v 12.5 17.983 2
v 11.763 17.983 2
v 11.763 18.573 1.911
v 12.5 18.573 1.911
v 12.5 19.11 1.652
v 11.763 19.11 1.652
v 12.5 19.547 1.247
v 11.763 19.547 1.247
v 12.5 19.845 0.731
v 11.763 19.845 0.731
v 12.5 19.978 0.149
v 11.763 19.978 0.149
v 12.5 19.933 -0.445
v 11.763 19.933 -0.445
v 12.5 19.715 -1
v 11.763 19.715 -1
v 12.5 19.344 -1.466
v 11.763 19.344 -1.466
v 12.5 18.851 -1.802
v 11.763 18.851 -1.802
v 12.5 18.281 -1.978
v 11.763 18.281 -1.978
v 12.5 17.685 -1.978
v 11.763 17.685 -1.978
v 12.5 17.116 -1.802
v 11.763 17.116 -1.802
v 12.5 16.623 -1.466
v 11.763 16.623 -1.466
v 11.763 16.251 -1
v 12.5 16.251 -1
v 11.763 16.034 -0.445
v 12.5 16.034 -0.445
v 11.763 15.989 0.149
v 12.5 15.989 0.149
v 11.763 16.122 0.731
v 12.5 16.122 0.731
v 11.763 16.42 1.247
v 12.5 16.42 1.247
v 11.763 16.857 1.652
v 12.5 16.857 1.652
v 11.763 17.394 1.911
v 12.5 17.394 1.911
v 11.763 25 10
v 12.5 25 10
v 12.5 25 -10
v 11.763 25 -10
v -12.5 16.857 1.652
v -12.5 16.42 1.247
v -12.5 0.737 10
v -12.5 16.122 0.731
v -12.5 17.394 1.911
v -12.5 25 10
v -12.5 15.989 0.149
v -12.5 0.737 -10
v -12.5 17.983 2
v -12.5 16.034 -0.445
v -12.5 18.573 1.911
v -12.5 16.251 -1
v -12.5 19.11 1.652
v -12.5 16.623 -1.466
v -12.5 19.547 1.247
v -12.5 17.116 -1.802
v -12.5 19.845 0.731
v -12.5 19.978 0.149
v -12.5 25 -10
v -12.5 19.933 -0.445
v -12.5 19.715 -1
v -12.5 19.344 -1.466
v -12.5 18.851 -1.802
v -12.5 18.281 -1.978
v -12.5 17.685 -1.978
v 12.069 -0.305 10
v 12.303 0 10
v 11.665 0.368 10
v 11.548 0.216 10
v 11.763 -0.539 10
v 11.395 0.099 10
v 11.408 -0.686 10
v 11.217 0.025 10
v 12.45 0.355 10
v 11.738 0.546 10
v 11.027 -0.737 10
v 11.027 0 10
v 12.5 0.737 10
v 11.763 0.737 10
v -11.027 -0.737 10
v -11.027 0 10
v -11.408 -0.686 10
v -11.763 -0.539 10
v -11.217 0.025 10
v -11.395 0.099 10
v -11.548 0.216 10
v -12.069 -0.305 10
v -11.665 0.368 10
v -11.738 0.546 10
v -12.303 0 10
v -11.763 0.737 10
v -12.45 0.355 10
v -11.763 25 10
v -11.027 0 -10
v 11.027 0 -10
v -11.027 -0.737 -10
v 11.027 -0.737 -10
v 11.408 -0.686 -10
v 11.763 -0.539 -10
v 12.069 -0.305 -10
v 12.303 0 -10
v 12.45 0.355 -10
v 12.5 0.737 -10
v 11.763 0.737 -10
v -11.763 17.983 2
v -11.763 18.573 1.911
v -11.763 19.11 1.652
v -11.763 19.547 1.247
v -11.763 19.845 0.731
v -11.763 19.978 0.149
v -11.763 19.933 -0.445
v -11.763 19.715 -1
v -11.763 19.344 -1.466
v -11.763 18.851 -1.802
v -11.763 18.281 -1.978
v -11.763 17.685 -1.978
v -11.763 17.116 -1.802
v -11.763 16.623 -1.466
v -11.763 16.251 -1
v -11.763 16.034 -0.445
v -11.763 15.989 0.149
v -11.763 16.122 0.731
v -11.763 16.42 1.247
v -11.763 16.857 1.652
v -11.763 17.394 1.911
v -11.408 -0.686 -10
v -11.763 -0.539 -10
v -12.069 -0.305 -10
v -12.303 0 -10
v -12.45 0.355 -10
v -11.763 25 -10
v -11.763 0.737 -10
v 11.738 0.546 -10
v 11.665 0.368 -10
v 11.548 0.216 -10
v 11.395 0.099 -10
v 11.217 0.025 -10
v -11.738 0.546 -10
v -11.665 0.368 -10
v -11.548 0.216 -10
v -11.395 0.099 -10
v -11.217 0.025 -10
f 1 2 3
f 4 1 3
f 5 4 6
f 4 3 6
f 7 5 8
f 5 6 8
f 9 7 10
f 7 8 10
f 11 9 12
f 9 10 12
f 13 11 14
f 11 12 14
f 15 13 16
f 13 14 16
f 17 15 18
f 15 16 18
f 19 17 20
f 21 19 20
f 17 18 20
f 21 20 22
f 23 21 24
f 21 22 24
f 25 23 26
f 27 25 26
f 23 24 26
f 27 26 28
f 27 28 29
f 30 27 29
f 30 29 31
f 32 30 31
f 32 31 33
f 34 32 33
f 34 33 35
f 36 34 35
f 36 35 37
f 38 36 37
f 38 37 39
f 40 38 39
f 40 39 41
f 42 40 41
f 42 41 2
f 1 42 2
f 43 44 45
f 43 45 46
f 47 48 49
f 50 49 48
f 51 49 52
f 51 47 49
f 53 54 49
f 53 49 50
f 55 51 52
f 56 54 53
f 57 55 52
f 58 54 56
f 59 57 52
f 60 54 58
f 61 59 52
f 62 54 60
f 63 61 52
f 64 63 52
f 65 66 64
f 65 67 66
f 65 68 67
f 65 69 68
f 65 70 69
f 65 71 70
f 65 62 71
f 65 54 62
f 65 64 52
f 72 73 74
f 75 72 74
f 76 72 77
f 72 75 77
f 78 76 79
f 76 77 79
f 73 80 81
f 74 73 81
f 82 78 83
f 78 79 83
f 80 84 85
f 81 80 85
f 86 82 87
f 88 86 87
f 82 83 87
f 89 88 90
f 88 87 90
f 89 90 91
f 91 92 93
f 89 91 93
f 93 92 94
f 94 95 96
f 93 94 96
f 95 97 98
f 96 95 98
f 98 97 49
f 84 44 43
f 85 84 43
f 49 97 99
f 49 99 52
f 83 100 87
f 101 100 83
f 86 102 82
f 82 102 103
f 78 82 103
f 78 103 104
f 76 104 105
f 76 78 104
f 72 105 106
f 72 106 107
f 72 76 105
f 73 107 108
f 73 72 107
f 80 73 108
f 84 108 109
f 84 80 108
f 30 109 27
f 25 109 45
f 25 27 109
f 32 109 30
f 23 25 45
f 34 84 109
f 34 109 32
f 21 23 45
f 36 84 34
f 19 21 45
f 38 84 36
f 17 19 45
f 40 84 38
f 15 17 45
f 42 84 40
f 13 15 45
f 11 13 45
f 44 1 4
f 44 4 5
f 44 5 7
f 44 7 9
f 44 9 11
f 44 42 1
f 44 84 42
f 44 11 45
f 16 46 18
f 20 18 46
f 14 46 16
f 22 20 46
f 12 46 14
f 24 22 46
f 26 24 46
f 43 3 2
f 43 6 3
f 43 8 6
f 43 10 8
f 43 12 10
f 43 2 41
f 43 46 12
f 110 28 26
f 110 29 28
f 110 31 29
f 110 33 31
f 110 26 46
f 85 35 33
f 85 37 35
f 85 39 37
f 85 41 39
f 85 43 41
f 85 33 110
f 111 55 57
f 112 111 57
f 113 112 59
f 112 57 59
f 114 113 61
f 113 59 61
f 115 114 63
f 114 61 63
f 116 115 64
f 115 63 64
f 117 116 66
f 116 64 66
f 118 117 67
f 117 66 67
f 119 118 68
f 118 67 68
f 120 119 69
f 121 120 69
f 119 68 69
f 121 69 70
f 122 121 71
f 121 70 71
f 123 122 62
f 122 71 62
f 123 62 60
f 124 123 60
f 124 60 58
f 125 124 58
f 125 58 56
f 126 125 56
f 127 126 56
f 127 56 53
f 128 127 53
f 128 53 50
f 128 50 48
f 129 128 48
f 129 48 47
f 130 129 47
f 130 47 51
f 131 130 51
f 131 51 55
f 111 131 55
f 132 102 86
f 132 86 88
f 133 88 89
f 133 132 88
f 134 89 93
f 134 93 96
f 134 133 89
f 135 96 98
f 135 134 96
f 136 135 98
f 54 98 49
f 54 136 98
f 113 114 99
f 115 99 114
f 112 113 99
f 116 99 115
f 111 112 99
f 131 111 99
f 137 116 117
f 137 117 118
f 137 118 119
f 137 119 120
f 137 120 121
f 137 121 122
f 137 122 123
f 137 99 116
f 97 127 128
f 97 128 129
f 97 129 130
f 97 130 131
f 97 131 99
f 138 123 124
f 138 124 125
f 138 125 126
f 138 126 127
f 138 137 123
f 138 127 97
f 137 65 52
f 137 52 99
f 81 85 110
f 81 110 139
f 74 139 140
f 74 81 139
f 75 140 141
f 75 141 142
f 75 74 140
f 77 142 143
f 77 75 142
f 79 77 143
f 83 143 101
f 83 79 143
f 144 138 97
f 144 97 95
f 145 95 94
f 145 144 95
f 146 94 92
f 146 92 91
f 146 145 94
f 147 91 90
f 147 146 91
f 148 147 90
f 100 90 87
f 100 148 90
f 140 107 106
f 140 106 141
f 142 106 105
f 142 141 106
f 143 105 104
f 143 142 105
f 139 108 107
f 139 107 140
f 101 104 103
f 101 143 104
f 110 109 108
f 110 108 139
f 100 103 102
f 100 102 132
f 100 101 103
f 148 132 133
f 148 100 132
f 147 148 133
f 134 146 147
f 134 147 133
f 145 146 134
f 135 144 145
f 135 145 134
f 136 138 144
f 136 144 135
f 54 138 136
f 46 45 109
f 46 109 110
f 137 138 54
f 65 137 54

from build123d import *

# Parameters (mm, degrees)
SKETCH1_W                      = 25
SKETCH1_H                      = 20
BASE_FLANGE1_DEPTH             = 0.7366
EDGE_FLANGE1_STRIP_W           = 4.4196
EDGE_FLANGE1_STRIP_H           = 0.7366
EDGE_FLANGE1_STRIP_CUT_DEPTH   = 20
EDGE_FLANGE1_STRIP_2_W         = 4.4196
EDGE_FLANGE1_STRIP_2_H         = 0.7366
EDGE_FLANGE1_STRIP_CUT_2_DEPTH = 20
EDGE_FLANGE1_DEPTH             = 20
EDGE_FLANGE1_BEND_DEPTH        = 20
F_4_0_4_DIAMETER_HOLE1_D       = 4


# Sheet-metal steps are written as plain solids
with BuildPart() as part:
    # Sketch1 → Base-Flange1 (new body)
    with BuildSketch(Plane(origin=(0, 0, 0), x_dir=(1, 0, 0), z_dir=(0, 1, 0))):
        Rectangle(SKETCH1_W, SKETCH1_H)
    extrude(amount=-BASE_FLANGE1_DEPTH)

    # Edge-Flange1 strip (across the edge) → Edge-Flange1 strip cut (cut)
    with BuildSketch(Plane(origin=(12.5, 0, 10), x_dir=(-1, 0, 0), z_dir=(0, 0, -1))):
        with Locations((-0.7366, -0.3683)):
            Rectangle(EDGE_FLANGE1_STRIP_W, EDGE_FLANGE1_STRIP_H)
    extrude(amount=EDGE_FLANGE1_STRIP_CUT_DEPTH, mode=Mode.SUBTRACT)

    # Edge-Flange1 strip 2 (across the edge) → Edge-Flange1 strip cut 2 (cut)
    with BuildSketch(Plane(origin=(-12.5, 0, -10), x_dir=(1, 0, 0), z_dir=(0, 0, 1))):
        with Locations((-0.7366, -0.3683)):
            Rectangle(EDGE_FLANGE1_STRIP_2_W, EDGE_FLANGE1_STRIP_2_H)
    extrude(amount=EDGE_FLANGE1_STRIP_CUT_2_DEPTH, mode=Mode.SUBTRACT)

    # Edge-Flange1 section (across the edge) → Edge-Flange1 (add)
    with BuildSketch(Plane(origin=(12.5, 0, 10), x_dir=(-1, 0, 0), z_dir=(0, 0, -1))):
        with BuildLine():
            Line((0, 0.7366), (0, 25))
            Line((0, 25), (0.7366, 25))
            Line((0.7366, 25), (0.7366, 0.7366))
            ThreePointArc((0.7366, 0.7366), (0.952345145, 0.215745145), (1.4732, 0))
            Line((1.4732, 0), (1.4732, -0.7366))
            ThreePointArc((1.4732, -0.7366), (0.43149029, -0.30510971), (0, 0.7366))
        make_face()
    extrude(amount=EDGE_FLANGE1_DEPTH)

    # Edge-Flange1 section 2 (across the edge) → Edge-Flange1 bend (add)
    with BuildSketch(Plane(origin=(-12.5, 0, -10), x_dir=(1, 0, 0), z_dir=(0, 0, 1))):
        with BuildLine():
            Line((0, 0.7366), (0, 25))
            Line((0, 25), (0.7366, 25))
            Line((0.7366, 25), (0.7366, 0.7366))
            ThreePointArc((0.7366, 0.7366), (0.952345145, 0.215745145), (1.4732, 0))
            Line((1.4732, 0), (1.4732, -0.7366))
            ThreePointArc((1.4732, -0.7366), (0.43149029, -0.30510971), (0, 0.7366))
        make_face()
    extrude(amount=EDGE_FLANGE1_BEND_DEPTH)

    # Ø4.0 (4) Diameter Hole1 (through all)
    with Locations(Plane(origin=(12.5, 0, 0), x_dir=(0, 0, -1), z_dir=(1, 0, 0))):
        with Locations((0, 17.9834)):
            Hole(F_4_0_4_DIAMETER_HOLE1_D / 2)


solid = part.part
